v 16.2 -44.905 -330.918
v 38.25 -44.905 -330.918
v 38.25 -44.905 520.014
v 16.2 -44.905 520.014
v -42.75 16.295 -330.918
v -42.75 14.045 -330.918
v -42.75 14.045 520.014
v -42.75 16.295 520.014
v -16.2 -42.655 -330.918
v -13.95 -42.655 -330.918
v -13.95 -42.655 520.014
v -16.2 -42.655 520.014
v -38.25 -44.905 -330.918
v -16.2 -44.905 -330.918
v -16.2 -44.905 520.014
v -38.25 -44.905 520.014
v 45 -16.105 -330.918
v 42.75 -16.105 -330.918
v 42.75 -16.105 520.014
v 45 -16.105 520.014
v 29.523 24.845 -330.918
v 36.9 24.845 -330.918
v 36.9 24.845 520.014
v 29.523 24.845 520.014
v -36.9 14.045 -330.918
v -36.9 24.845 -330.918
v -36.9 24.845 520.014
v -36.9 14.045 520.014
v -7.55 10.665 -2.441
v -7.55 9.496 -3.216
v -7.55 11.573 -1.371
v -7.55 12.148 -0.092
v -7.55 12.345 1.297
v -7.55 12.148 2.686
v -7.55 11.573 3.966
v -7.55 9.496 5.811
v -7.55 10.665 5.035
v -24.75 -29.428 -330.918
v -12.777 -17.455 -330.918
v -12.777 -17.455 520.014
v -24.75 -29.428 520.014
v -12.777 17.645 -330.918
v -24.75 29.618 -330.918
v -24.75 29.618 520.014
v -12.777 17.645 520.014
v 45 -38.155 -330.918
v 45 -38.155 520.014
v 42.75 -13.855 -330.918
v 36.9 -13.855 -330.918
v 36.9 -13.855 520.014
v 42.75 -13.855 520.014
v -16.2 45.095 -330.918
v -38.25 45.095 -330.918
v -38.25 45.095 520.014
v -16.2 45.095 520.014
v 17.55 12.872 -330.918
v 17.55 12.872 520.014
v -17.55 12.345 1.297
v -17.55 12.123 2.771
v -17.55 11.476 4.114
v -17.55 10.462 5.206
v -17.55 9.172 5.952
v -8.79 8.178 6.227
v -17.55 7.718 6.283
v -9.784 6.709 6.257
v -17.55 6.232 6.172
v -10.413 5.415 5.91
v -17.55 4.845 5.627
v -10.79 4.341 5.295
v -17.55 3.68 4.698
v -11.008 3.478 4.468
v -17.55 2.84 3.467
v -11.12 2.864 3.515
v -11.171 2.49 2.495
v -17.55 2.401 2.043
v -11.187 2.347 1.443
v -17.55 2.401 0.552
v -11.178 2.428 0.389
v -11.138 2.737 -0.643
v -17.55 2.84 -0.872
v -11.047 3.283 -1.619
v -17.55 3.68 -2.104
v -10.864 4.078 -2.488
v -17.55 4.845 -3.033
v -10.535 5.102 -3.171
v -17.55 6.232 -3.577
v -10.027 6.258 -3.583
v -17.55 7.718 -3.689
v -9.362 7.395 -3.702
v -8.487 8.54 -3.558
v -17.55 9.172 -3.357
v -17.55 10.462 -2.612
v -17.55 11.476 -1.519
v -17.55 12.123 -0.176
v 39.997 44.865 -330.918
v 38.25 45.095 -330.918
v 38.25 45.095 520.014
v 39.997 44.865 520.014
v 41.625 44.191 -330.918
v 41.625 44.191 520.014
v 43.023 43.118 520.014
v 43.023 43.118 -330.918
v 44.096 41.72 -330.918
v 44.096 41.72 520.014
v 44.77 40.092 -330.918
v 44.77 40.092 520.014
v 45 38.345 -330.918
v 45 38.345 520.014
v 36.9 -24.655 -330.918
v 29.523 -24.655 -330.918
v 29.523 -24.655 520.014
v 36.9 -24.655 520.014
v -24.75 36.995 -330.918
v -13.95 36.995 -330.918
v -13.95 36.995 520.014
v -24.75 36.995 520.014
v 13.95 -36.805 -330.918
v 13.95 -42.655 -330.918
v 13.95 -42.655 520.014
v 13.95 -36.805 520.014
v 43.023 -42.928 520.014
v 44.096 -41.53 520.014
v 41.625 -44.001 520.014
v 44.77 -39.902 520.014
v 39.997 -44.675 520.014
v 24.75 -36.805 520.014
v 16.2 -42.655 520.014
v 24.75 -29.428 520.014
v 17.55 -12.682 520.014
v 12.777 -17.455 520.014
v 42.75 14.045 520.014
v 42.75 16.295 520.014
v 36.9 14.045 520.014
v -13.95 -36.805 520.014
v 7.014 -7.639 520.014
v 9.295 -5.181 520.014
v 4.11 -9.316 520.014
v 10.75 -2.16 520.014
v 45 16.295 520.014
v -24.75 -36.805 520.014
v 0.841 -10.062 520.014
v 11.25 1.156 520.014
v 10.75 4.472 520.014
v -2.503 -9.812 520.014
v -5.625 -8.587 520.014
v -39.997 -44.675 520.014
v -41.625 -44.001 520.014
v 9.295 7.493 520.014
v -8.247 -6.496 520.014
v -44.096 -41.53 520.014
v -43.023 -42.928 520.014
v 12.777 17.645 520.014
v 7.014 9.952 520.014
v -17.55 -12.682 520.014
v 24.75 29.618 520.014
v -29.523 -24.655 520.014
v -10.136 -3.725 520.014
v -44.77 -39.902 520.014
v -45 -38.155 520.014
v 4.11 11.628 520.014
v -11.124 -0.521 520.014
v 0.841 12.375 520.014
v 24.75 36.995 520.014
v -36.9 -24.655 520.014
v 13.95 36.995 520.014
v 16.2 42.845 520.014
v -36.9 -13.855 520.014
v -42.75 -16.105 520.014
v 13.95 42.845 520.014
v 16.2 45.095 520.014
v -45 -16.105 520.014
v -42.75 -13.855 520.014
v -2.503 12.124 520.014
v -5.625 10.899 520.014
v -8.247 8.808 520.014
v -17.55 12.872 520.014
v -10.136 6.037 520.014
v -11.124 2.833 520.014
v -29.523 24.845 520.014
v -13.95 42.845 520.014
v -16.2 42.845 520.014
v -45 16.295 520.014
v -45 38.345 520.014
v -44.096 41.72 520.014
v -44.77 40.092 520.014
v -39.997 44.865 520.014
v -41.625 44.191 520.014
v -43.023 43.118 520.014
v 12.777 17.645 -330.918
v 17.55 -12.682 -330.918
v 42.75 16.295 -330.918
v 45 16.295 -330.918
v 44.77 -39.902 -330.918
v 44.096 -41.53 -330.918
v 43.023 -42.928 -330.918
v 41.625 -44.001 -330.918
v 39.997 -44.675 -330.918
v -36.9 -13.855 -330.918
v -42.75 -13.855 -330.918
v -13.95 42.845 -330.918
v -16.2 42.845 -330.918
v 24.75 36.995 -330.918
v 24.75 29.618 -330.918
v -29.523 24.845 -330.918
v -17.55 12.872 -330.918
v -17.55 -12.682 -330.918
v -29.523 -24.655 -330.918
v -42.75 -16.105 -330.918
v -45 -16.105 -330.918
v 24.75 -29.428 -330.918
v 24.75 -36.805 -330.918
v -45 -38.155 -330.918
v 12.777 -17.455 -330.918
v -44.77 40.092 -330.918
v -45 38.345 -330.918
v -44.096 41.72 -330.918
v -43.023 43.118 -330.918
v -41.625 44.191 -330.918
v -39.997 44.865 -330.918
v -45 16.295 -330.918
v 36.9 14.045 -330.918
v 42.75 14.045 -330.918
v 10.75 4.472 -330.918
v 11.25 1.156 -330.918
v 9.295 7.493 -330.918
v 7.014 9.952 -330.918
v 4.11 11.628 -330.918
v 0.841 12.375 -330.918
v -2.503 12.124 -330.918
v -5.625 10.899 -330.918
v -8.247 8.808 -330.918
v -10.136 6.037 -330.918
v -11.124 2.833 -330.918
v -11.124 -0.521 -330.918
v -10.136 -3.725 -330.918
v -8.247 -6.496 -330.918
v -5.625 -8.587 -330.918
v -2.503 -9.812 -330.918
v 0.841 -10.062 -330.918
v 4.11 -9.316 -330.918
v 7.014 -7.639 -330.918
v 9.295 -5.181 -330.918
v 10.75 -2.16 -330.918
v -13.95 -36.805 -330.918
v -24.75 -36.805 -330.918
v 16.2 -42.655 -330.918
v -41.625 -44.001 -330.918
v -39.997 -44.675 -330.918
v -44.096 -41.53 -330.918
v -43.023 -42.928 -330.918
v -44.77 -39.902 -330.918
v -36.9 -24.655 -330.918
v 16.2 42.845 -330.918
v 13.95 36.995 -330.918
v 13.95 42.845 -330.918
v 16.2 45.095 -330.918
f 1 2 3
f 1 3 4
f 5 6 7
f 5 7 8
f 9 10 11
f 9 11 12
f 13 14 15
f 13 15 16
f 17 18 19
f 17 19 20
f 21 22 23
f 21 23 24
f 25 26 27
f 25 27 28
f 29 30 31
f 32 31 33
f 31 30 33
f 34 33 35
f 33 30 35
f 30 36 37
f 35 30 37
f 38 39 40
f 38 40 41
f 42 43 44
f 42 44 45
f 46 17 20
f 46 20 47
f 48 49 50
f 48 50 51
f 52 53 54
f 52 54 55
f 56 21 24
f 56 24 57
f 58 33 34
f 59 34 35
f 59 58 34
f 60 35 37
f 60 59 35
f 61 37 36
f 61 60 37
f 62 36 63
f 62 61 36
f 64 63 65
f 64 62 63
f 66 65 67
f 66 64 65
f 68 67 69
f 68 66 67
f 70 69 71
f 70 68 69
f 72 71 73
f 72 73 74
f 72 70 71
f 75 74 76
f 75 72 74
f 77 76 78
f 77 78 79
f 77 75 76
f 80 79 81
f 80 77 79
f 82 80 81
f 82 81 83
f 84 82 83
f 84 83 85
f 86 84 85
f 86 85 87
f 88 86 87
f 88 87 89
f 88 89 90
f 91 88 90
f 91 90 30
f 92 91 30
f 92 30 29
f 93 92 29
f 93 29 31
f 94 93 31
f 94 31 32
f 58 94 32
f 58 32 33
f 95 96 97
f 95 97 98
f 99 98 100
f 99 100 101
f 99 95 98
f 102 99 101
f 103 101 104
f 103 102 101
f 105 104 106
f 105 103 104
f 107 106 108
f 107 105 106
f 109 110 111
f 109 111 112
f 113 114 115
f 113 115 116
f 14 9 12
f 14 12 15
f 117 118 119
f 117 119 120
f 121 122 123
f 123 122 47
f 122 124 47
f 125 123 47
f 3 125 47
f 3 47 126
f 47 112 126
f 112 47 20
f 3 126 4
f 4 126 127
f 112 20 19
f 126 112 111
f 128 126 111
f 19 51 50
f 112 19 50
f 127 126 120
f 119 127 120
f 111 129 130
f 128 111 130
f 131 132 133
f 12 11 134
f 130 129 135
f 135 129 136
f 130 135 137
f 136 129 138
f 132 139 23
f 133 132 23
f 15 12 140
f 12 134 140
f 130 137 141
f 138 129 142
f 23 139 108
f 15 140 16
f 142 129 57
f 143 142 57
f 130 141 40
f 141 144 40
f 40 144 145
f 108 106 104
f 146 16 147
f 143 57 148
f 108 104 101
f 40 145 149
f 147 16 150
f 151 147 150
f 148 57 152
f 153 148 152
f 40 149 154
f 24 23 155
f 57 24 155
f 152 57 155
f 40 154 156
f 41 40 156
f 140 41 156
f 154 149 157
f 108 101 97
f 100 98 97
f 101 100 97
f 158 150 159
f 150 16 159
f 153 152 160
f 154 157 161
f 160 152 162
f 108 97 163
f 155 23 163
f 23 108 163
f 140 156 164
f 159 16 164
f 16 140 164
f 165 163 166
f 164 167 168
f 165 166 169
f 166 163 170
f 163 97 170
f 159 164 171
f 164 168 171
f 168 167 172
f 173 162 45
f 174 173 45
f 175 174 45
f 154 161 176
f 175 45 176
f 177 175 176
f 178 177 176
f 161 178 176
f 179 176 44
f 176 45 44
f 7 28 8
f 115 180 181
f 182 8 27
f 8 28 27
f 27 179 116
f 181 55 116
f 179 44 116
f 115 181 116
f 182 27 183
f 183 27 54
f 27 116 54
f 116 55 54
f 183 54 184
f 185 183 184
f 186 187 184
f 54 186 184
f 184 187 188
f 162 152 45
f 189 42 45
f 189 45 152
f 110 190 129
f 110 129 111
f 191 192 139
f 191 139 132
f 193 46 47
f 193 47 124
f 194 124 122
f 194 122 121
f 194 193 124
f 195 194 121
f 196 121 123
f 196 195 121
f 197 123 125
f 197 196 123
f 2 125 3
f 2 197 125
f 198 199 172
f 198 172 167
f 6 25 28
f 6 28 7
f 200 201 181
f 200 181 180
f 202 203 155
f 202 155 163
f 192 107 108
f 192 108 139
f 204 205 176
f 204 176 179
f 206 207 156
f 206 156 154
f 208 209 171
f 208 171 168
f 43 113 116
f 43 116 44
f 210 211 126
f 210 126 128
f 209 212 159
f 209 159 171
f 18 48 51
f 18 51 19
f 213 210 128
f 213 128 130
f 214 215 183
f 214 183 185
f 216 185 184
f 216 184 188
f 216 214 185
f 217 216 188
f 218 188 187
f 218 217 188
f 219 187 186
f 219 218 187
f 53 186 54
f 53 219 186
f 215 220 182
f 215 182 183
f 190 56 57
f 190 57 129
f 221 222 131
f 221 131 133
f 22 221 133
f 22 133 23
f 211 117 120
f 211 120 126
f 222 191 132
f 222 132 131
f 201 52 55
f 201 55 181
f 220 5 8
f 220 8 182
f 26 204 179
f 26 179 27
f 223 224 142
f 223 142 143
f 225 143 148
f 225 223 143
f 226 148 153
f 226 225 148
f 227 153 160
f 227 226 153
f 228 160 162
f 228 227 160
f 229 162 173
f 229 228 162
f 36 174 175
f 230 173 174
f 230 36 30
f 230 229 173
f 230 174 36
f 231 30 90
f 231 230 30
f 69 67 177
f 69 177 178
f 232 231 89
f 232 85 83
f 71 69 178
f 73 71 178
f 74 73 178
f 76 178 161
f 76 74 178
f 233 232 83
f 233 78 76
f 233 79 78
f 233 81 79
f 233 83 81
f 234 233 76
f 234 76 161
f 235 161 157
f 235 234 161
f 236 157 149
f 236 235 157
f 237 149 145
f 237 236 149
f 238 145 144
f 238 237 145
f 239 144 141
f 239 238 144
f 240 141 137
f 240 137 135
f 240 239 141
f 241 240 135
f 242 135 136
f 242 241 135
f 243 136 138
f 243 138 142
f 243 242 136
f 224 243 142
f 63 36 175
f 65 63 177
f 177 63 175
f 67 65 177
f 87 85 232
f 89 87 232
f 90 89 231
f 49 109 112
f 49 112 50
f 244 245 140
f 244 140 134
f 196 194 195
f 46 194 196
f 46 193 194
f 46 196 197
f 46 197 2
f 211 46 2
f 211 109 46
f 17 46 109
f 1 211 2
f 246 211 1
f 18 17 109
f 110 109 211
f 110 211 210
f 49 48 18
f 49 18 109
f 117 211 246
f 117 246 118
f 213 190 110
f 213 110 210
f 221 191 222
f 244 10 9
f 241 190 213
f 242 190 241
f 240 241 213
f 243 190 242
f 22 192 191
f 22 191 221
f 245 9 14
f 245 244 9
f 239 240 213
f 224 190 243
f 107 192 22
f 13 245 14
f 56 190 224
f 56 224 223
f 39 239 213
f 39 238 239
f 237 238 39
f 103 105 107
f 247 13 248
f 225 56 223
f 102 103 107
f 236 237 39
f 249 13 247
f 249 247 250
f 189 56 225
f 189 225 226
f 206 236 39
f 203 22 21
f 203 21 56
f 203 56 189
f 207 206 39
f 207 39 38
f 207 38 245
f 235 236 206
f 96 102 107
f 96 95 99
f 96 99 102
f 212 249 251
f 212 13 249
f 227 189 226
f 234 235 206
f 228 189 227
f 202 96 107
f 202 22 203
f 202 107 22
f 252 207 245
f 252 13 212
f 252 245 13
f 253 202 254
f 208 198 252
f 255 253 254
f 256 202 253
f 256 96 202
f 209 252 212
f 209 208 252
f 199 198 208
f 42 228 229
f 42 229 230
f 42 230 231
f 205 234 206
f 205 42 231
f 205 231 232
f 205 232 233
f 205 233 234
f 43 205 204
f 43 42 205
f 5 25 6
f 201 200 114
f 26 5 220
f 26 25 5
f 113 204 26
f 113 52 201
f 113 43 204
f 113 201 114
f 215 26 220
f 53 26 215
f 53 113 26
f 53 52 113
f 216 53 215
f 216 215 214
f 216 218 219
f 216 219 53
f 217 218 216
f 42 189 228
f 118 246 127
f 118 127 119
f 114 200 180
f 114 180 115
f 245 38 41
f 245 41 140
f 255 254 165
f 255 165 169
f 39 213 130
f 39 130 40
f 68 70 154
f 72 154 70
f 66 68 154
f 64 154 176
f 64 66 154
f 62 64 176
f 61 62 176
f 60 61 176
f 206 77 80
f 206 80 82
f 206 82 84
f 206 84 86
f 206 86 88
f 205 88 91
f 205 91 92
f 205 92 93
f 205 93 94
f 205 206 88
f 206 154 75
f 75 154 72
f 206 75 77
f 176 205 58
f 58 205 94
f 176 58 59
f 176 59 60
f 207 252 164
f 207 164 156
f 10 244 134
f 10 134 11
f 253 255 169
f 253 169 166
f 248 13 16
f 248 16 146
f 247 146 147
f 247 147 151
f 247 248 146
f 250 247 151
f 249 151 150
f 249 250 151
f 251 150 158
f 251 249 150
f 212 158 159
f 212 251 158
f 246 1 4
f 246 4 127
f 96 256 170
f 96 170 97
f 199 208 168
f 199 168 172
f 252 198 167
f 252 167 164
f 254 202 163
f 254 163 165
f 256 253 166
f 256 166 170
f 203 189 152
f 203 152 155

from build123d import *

# Parameters (mm, degrees)
SKETCH1_R           = 2.5
BOSS_EXTRUDE1_DEPTH = 189.096108091
SCALE_2_SCALE       = 3
SCALE_3_SCALE       = 6
SCALE_5_SCALE       = 2
SCALE_6_SCALE       = 0.25
SCALE_7_SCALE       = 0.125
SCALE_8_SCALE       = 0.25
SCALE_9_SCALE       = 4
SCALE_10_SCALE      = 4
OTHER_START         = -17.55
OTHER_1_OUTLINE_R   = 5
OTHER_1_DEPTH       = 10


# Read off the part's stored shape, not the designer's step: 孔1
with BuildPart() as part:
    # Sketch1 → Boss-Extrude1 (new body)
    with BuildSketch(Plane.XY):
        with BuildLine():
            Line((2.839339828, 3.9), (5.5, 6.560660172))
            Line((5.5, 6.560660172), (5.5, 8.2))
            Line((5.5, 8.2), (3.1, 8.2))
            Line((3.1, 8.2), (3.1, 9.5))
            Line((3.1, 9.5), (3.6, 9.5))
            Line((3.6, 9.5), (3.6, 10))
            Line((3.6, 10), (8.5, 10))
            ThreePointArc((8.5, 10), (9.560660172, 9.560660172), (10, 8.5))
            Line((10, 8.5), (10, 3.6))
            Line((10, 3.6), (9.5, 3.6))
            Line((9.5, 3.6), (9.5, 3.1))
            Line((9.5, 3.1), (8.2, 3.1))
            Line((8.2, 3.1), (8.2, 5.5))
            Line((8.2, 5.5), (6.560660172, 5.5))
            Line((6.560660172, 5.5), (3.9, 2.839339828))
            Line((3.9, 2.839339828), (3.9, -2.839339828))
            Line((3.9, -2.839339828), (6.560660172, -5.5))
            Line((6.560660172, -5.5), (8.2, -5.5))
            Line((8.2, -5.5), (8.2, -3.1))
            Line((8.2, -3.1), (9.5, -3.1))
            Line((9.5, -3.1), (9.5, -3.6))
            Line((9.5, -3.6), (10, -3.6))
            Line((10, -3.6), (10, -8.5))
            ThreePointArc((10, -8.5), (9.560660172, -9.560660172), (8.5, -10))
            Line((8.5, -10), (3.6, -10))
            Line((3.6, -10), (3.6, -9.5))
            Line((3.6, -9.5), (3.1, -9.5))
            Line((3.1, -9.5), (3.1, -8.2))
            Line((3.1, -8.2), (5.5, -8.2))
            Line((5.5, -8.2), (5.5, -6.560660172))
            Line((5.5, -6.560660172), (2.839339828, -3.9))
            Line((2.839339828, -3.9), (-2.839339828, -3.9))
            Line((-2.839339828, -3.9), (-5.5, -6.560660172))
            Line((-5.5, -6.560660172), (-5.5, -8.2))
            Line((-5.5, -8.2), (-3.1, -8.2))
            Line((-3.1, -8.2), (-3.1, -9.5))
            Line((-3.1, -9.5), (-3.6, -9.5))
            Line((-3.6, -9.5), (-3.6, -10))
            Line((-3.6, -10), (-8.5, -10))
            ThreePointArc((-8.5, -10), (-9.560660172, -9.560660172), (-10, -8.5))
            Line((-10, -8.5), (-10, -3.6))
            Line((-10, -3.6), (-9.5, -3.6))
            Line((-9.5, -3.6), (-9.5, -3.1))
            Line((-9.5, -3.1), (-8.2, -3.1))
            Line((-8.2, -3.1), (-8.2, -5.5))
            Line((-8.2, -5.5), (-6.560660172, -5.5))
            Line((-6.560660172, -5.5), (-3.9, -2.839339828))
            Line((-3.9, -2.839339828), (-3.9, 2.839339828))
            Line((-3.9, 2.839339828), (-6.560660172, 5.5))
            Line((-6.560660172, 5.5), (-8.2, 5.5))
            Line((-8.2, 5.5), (-8.2, 3.1))
            Line((-8.2, 3.1), (-9.5, 3.1))
            Line((-9.5, 3.1), (-9.5, 3.6))
            Line((-9.5, 3.6), (-10, 3.6))
            Line((-10, 3.6), (-10, 8.5))
            ThreePointArc((-10, 8.5), (-9.560660172, 9.560660172), (-8.5, 10))
            Line((-8.5, 10), (-3.6, 10))
            Line((-3.6, 10), (-3.6, 9.5))
            Line((-3.6, 9.5), (-3.1, 9.5))
            Line((-3.1, 9.5), (-3.1, 8.2))
            Line((-3.1, 8.2), (-5.5, 8.2))
            Line((-5.5, 8.2), (-5.5, 6.560660172))
            Line((-5.5, 6.560660172), (-2.839339828, 3.9))
            Line((-2.839339828, 3.9), (2.839339828, 3.9))
        make_face()
        with Locations((0, 0.235847297)):
            Circle(SKETCH1_R, mode=Mode.SUBTRACT)
    extrude(amount=BOSS_EXTRUDE1_DEPTH)


with BuildPart() as part_1:
    # 缩放比例2: scaled about (0, -0.027095247, 94.548054046)
    add(part.part.scale(SCALE_2_SCALE).moved(Location((0, 0.054190494, -189.096108092))))


with BuildPart() as part_2:
    # 缩放比例3: scaled about (0, -0.027095247, 94.548054045)
    add(part_1.part.scale(SCALE_3_SCALE).moved(Location((0, 0.135476235, -472.740270225))))


with BuildPart() as part_3:
    # 缩放比例5: scaled about (0, -0.027095249, 94.548054043)
    add(part_2.part.scale(SCALE_5_SCALE).moved(Location((0, 0.027095249, -94.548054043))))


with BuildPart() as part_4:
    # 缩放比例6: scaled about (0, -0.027095249, 94.548054044)
    add(part_3.part.scale(SCALE_6_SCALE).moved(Location((0, -0.020321437, 70.911040533))))


with BuildPart() as part_5:
    # 缩放比例7: scaled about (0, -0.027095249, 94.548054044)
    add(part_4.part.scale(SCALE_7_SCALE).moved(Location((0, -0.023708343, 82.729547289))))


with BuildPart() as part_6:
    # 缩放比例8: scaled about (0, -0.027095249, 94.548054044)
    add(part_5.part.scale(SCALE_8_SCALE).moved(Location((0, -0.020321437, 70.911040533))))


with BuildPart() as part_7:
    # 缩放比例9: scaled about (0, -0.027095249, 94.548054044)
    add(part_6.part.scale(SCALE_9_SCALE).moved(Location((0, 0.081285747, -283.644162132))))


with BuildPart() as part_8:
    # 缩放比例10: scaled about (0, -0.027095249, 94.548054044)
    add(part_7.part.scale(SCALE_10_SCALE).moved(Location((0, 0.081285747, -283.644162132))))

    # 孔1 outline → 孔1 (cut)
    with BuildSketch(Plane.YZ.offset(OTHER_START)):
        with Locations((7.344833538, 1.297306883)):
            Circle(OTHER_1_OUTLINE_R)
    extrude(amount=OTHER_1_DEPTH, mode=Mode.SUBTRACT)


solid = part_8.part
